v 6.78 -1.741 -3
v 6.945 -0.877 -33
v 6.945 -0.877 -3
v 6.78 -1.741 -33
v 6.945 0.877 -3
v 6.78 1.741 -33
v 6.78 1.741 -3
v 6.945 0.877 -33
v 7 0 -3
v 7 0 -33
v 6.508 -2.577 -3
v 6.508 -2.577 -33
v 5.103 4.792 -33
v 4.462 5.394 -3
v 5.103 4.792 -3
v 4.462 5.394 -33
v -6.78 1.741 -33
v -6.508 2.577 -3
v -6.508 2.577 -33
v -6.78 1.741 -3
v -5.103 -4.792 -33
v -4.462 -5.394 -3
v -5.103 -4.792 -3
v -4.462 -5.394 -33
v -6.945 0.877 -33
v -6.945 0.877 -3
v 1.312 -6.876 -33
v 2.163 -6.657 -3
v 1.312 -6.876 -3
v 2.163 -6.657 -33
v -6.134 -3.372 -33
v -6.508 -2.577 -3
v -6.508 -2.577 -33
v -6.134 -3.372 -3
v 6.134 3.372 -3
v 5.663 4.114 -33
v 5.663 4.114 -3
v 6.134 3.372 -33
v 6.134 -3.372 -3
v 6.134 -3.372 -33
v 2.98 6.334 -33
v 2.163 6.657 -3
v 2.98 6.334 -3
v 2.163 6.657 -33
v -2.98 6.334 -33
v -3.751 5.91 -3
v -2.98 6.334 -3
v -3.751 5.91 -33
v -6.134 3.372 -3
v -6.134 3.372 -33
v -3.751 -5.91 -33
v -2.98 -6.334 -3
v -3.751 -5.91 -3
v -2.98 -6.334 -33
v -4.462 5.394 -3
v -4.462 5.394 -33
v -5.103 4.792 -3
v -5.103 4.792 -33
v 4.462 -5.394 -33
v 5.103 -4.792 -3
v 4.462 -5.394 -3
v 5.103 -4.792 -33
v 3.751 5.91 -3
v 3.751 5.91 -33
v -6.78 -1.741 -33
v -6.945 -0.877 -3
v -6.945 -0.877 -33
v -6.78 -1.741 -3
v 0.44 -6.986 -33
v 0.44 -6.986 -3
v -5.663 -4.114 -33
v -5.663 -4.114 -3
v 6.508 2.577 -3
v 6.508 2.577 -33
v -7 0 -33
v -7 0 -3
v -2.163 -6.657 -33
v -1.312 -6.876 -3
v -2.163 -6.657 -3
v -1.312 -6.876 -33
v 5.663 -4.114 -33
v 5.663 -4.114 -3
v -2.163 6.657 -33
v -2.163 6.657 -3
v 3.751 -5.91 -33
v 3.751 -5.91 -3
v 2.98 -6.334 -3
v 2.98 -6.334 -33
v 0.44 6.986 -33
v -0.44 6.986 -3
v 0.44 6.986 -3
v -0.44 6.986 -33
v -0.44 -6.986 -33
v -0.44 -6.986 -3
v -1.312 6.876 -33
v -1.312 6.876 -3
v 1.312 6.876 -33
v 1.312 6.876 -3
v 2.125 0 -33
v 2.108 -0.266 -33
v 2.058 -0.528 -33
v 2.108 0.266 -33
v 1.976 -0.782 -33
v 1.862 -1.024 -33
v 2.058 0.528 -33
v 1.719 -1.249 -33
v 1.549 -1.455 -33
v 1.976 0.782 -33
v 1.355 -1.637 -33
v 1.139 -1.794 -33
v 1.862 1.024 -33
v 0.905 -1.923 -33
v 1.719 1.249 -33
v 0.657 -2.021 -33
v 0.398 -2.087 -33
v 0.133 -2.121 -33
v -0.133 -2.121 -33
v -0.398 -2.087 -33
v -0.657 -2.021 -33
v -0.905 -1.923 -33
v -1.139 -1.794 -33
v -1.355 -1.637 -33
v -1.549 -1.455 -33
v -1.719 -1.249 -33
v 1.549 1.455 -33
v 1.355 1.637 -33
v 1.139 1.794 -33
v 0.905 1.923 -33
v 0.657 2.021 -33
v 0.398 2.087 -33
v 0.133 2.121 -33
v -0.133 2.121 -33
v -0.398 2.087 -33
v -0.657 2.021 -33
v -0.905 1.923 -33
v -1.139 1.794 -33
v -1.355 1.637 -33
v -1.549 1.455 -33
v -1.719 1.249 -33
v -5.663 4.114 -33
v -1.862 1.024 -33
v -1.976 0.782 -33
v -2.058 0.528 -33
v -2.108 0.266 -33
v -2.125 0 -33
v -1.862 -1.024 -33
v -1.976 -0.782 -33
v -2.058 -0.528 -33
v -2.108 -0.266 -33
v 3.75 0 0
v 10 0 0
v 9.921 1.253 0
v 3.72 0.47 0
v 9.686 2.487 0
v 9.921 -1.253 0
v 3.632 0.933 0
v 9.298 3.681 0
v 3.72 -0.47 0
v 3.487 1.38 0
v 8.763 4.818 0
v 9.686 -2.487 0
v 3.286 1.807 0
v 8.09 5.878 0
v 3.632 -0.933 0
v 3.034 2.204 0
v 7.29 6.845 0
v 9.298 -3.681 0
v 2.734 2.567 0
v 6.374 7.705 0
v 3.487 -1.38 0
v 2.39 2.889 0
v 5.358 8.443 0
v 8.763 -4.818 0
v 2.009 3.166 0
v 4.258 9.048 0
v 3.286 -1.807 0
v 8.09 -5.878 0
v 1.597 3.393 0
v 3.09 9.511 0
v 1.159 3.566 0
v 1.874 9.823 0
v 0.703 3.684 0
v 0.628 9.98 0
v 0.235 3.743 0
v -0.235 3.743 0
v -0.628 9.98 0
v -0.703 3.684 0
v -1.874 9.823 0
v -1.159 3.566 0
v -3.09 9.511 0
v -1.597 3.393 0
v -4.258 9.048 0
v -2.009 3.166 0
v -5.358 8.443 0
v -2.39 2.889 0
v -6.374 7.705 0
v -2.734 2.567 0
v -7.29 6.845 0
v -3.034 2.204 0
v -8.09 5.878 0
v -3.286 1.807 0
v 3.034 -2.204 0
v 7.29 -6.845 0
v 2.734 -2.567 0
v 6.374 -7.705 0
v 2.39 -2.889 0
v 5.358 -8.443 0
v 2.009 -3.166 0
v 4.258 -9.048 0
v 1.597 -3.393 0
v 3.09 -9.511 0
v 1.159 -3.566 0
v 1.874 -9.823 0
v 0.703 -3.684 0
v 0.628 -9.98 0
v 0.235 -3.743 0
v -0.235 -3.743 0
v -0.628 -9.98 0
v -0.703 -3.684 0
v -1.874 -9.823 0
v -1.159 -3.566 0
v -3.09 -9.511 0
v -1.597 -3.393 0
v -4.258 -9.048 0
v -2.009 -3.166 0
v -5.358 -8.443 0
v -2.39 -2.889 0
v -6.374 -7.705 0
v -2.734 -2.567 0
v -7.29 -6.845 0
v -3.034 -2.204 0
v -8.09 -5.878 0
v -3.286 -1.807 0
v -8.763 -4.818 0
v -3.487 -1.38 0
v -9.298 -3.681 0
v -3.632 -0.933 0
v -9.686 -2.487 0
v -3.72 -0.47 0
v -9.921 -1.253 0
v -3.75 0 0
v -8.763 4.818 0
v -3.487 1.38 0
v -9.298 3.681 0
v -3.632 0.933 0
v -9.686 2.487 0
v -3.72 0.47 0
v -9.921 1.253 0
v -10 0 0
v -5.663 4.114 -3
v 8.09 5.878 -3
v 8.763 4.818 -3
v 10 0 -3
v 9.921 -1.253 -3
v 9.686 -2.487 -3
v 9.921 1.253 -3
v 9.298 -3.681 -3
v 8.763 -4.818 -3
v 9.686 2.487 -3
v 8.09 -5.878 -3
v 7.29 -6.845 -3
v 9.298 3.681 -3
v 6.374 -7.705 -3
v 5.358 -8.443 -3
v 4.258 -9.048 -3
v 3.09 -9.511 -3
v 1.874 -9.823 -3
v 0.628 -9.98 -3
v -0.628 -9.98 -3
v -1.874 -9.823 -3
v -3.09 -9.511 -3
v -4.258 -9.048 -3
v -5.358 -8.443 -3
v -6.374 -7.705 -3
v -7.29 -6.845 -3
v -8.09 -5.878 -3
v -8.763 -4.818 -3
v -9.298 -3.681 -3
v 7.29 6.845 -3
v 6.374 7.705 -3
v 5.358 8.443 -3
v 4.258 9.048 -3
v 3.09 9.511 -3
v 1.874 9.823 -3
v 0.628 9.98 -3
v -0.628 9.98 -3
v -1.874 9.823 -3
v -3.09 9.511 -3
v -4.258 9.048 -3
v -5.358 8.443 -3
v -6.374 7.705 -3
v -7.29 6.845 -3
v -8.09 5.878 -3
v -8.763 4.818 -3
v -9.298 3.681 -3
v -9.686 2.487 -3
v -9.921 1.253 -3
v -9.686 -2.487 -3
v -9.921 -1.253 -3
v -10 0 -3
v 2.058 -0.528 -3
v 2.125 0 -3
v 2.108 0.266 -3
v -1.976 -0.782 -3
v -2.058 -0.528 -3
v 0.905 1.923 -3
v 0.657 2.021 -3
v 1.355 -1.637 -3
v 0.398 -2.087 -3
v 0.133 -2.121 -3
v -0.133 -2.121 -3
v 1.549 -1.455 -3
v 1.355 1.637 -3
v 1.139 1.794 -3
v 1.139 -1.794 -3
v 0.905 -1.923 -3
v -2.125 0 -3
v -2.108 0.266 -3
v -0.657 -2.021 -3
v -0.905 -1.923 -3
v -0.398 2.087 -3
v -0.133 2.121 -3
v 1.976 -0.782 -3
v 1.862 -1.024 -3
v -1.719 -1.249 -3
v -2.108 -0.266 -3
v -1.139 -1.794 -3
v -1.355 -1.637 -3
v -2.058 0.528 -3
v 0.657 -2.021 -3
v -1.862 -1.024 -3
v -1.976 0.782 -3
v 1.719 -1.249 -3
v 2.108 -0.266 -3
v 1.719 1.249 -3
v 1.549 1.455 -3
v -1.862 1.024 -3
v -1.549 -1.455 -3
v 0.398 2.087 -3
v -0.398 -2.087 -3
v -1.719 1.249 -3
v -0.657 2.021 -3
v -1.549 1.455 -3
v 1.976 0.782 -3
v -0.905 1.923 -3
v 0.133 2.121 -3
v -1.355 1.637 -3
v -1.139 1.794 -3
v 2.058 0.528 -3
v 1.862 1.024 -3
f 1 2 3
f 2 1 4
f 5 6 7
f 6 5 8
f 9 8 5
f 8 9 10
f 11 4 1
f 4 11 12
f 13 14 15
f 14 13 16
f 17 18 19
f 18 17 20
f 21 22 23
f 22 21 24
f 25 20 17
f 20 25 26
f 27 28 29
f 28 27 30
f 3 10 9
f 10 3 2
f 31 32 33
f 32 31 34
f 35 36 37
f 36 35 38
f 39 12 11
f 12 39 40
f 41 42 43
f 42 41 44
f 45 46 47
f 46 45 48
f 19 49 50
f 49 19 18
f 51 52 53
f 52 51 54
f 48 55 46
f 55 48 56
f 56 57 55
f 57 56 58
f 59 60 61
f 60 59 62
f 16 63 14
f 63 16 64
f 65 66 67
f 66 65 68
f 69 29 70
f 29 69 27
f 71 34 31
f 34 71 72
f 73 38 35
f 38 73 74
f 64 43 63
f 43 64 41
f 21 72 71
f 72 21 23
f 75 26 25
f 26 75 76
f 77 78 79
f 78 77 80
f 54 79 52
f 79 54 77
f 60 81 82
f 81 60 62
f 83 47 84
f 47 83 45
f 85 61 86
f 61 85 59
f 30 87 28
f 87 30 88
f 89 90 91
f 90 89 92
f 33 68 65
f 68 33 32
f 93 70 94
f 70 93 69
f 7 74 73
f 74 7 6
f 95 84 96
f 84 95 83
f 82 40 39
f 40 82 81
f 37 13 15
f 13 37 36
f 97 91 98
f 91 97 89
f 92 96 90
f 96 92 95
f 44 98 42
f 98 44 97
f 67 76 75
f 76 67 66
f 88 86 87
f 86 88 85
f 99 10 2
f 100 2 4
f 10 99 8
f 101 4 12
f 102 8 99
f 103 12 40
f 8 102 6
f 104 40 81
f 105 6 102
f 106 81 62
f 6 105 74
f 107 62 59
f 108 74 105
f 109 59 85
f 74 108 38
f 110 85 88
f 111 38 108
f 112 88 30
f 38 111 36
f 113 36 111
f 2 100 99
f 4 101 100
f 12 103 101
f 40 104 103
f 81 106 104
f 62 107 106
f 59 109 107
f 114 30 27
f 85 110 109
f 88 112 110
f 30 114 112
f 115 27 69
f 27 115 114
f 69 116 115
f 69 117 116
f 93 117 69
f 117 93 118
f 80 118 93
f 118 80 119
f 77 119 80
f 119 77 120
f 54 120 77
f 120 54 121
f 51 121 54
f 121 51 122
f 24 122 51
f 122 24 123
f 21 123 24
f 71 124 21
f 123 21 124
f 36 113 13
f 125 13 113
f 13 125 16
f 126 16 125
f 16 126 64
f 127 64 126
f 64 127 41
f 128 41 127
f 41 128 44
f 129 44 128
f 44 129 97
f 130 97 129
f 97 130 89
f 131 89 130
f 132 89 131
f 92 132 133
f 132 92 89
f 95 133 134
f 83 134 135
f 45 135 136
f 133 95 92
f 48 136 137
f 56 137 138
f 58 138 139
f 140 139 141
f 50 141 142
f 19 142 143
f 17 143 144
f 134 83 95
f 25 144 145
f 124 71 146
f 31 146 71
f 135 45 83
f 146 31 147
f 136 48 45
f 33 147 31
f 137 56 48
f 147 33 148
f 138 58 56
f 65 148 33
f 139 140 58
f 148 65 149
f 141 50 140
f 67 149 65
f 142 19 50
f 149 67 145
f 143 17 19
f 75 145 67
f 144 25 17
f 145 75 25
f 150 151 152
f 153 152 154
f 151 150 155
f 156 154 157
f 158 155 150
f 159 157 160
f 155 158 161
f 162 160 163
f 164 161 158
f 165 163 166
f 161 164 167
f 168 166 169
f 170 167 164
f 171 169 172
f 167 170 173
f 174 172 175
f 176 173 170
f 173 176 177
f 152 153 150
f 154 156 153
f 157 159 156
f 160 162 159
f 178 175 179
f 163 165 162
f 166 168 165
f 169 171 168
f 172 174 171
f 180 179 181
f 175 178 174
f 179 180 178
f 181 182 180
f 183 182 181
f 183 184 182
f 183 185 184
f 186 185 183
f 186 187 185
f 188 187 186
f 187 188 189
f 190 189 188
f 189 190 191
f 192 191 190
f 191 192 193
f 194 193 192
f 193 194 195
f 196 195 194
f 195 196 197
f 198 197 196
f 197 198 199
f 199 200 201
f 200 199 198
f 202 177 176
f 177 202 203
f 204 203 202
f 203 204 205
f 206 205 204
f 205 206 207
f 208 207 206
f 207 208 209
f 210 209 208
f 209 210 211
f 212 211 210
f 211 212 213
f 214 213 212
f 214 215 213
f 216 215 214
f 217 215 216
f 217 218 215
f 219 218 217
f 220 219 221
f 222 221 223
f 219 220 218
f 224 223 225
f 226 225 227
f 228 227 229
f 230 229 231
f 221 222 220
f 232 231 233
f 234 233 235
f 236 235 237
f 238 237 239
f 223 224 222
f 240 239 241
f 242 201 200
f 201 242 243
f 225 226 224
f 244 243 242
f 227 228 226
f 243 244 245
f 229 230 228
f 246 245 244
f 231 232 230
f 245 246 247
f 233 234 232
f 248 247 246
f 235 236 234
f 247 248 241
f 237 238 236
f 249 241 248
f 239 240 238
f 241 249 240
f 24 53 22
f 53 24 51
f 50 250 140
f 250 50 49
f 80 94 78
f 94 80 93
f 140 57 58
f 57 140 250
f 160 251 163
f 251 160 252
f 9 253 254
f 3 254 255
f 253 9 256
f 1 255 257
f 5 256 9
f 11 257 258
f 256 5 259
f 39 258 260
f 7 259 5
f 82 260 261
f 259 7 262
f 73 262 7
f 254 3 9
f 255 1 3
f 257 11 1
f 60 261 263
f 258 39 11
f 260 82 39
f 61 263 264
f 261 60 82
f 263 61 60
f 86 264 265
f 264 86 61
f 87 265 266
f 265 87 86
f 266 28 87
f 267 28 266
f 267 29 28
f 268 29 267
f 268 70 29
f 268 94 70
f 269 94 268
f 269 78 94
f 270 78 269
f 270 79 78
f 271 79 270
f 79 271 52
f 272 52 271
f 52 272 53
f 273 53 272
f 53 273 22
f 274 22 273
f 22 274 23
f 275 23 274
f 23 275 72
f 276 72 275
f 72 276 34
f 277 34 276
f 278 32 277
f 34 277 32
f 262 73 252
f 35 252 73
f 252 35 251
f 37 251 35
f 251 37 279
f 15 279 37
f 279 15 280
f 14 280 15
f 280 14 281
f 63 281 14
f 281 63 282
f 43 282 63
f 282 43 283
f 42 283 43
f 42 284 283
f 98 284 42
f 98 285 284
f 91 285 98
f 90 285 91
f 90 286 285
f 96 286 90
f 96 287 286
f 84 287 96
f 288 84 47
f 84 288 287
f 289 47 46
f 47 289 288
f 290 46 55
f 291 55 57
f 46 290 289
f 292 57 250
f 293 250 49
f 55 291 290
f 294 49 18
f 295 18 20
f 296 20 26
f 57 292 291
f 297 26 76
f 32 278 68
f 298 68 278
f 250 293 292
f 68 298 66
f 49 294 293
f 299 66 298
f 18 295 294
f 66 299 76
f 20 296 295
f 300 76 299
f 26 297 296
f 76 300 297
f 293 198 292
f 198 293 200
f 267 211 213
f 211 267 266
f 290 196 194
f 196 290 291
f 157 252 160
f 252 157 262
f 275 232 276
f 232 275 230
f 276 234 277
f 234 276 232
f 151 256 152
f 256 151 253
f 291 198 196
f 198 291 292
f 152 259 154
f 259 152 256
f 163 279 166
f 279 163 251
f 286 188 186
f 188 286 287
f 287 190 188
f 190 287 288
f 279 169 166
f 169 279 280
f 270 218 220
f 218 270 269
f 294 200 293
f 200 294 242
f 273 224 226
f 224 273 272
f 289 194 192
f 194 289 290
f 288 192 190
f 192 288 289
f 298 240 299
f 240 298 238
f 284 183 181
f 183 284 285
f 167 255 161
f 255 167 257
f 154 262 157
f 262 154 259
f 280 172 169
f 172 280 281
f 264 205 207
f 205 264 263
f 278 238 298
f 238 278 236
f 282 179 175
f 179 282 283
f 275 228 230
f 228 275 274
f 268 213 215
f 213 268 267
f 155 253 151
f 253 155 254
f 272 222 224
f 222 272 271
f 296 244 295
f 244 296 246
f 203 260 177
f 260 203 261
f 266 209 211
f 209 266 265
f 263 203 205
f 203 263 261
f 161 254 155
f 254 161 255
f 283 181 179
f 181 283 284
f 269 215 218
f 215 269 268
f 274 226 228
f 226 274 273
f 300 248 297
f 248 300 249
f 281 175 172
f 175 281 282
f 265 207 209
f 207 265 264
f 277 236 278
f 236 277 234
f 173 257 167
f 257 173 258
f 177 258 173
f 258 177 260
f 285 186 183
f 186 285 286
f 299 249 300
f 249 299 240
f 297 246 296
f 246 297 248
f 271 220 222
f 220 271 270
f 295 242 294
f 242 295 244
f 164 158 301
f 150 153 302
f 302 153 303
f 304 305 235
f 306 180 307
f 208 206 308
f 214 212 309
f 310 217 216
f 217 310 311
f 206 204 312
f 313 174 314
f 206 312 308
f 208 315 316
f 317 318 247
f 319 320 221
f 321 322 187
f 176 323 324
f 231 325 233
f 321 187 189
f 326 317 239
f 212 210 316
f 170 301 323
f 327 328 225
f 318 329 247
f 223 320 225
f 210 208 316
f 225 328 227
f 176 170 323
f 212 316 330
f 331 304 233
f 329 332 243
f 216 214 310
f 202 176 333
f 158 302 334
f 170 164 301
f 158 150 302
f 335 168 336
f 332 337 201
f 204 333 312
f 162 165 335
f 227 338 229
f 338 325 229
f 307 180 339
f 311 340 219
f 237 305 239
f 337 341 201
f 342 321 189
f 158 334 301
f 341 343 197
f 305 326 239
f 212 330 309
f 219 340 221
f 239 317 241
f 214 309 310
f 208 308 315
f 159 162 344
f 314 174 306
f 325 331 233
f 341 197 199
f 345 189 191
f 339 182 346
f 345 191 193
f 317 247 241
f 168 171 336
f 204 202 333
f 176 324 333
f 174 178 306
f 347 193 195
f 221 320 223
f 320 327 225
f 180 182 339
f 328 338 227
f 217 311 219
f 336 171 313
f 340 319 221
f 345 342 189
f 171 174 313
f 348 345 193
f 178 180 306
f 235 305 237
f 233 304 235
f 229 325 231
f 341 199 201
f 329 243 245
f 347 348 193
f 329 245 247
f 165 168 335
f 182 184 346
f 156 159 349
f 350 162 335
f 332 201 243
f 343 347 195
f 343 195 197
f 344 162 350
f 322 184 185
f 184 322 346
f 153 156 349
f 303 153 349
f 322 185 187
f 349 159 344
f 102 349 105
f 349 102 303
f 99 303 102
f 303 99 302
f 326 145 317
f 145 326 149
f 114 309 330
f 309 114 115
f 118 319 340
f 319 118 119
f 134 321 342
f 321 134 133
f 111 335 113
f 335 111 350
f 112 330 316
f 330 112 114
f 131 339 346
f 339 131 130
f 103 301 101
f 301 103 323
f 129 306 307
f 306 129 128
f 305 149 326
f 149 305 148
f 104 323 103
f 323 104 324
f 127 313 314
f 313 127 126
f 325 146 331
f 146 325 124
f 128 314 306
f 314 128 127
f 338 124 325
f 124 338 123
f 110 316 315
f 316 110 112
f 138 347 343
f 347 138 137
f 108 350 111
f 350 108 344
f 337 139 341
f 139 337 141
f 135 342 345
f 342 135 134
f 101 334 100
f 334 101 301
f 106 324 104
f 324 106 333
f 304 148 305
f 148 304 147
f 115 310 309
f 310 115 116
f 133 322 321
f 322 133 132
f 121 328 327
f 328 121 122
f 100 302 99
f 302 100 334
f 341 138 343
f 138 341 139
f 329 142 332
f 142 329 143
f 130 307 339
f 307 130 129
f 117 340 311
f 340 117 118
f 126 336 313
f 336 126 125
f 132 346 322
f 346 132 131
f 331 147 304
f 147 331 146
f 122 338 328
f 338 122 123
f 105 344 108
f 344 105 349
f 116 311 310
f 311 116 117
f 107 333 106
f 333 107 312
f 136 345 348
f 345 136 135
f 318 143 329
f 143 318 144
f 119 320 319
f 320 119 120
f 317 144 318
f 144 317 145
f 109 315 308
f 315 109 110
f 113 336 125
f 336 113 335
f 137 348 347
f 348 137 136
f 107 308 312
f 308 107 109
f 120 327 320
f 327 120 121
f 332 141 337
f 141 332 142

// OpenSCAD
$fn = 50;


difference() {
	union() {
		translate(v = [0, 0, -33.0000000000]) {
			cylinder(h = 33, r = 7.0000000000);
		}
		translate(v = [0, 0, -3.0000000000]) {
			cylinder(h = 3, r = 10.0000000000);
		}
	}
	union() {
		translate(v = [0, 0, 0]) {
			rotate(a = [0, 0, 0]) {
				difference() {
					union() {
						#translate(v = [0, 0, -33.0000000000]) {
							cylinder(h = 33, r = 2.0000000000);
						}
						#translate(v = [0, 0, -3]) {
							cylinder(h = 3, r = 7.0000000000, r1 = 2.1250000000, r2 = 3.7500000000);
						}
						#translate(v = [0, 0, -33.0000000000]) {
							cylinder(h = 33, r = 2.1250000000);
						}
						#translate(v = [0, 0, -33.0000000000]) {
							cylinder(h = 33, r = 2.0000000000);
						}
					}
					union();
				}
			}
		}
	}
}
